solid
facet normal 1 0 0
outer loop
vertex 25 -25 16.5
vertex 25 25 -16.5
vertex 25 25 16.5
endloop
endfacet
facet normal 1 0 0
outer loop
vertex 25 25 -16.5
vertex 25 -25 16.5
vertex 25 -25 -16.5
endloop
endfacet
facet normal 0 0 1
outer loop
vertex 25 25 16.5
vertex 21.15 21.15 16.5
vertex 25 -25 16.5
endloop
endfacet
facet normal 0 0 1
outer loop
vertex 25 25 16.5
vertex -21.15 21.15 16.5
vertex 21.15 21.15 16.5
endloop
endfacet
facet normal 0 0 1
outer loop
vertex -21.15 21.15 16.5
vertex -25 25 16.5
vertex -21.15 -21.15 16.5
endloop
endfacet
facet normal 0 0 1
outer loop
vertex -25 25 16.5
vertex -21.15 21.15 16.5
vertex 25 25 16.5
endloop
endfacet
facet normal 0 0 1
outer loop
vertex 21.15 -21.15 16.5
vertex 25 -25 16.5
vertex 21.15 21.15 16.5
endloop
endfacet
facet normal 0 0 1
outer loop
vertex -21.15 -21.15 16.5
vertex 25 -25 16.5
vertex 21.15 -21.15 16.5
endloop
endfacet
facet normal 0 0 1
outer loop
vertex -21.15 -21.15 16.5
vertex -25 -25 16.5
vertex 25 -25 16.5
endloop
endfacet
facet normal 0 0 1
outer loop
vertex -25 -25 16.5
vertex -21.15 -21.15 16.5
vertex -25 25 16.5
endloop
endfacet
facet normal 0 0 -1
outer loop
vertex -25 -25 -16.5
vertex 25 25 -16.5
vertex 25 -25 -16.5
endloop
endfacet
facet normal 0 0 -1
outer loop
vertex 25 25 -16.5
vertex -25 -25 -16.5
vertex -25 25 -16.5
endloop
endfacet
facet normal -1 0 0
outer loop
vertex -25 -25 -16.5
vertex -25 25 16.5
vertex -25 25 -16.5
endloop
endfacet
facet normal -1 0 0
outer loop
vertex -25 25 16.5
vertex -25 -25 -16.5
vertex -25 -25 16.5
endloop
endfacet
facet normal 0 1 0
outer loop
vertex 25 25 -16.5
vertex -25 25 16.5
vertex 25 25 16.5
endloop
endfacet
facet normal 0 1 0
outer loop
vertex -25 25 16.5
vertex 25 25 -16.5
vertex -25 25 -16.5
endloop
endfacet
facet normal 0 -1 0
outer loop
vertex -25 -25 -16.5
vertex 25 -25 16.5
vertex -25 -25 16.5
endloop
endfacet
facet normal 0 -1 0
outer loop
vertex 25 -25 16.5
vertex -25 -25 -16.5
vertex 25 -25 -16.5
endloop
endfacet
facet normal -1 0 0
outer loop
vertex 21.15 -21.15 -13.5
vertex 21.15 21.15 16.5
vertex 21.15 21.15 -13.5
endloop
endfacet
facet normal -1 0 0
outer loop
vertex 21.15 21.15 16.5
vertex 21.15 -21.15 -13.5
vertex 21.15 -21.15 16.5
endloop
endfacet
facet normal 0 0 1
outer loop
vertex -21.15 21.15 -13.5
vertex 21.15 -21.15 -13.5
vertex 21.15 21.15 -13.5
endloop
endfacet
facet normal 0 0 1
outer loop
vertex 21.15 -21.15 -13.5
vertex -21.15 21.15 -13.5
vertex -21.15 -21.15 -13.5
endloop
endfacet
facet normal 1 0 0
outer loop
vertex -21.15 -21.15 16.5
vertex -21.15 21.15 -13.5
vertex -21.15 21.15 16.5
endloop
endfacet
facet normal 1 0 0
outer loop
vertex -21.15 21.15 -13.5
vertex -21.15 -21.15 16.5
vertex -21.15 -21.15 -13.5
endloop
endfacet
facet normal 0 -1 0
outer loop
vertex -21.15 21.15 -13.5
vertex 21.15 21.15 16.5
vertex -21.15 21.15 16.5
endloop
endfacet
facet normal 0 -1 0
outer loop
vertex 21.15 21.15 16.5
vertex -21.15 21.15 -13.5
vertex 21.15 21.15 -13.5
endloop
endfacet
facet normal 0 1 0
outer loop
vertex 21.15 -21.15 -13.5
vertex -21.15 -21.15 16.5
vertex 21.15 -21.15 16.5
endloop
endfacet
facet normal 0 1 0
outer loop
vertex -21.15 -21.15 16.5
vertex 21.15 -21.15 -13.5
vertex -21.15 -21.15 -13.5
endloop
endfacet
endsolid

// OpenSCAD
Height=33; //[5:1:100]
X=42.3; //[5:1:100]
Y=42.3; //[5:1:100]

difference() {
        
    cube([50,50,Height],center=true);
    translate([0,0,3])
    cube([X,Y,Height],center=true);
}
